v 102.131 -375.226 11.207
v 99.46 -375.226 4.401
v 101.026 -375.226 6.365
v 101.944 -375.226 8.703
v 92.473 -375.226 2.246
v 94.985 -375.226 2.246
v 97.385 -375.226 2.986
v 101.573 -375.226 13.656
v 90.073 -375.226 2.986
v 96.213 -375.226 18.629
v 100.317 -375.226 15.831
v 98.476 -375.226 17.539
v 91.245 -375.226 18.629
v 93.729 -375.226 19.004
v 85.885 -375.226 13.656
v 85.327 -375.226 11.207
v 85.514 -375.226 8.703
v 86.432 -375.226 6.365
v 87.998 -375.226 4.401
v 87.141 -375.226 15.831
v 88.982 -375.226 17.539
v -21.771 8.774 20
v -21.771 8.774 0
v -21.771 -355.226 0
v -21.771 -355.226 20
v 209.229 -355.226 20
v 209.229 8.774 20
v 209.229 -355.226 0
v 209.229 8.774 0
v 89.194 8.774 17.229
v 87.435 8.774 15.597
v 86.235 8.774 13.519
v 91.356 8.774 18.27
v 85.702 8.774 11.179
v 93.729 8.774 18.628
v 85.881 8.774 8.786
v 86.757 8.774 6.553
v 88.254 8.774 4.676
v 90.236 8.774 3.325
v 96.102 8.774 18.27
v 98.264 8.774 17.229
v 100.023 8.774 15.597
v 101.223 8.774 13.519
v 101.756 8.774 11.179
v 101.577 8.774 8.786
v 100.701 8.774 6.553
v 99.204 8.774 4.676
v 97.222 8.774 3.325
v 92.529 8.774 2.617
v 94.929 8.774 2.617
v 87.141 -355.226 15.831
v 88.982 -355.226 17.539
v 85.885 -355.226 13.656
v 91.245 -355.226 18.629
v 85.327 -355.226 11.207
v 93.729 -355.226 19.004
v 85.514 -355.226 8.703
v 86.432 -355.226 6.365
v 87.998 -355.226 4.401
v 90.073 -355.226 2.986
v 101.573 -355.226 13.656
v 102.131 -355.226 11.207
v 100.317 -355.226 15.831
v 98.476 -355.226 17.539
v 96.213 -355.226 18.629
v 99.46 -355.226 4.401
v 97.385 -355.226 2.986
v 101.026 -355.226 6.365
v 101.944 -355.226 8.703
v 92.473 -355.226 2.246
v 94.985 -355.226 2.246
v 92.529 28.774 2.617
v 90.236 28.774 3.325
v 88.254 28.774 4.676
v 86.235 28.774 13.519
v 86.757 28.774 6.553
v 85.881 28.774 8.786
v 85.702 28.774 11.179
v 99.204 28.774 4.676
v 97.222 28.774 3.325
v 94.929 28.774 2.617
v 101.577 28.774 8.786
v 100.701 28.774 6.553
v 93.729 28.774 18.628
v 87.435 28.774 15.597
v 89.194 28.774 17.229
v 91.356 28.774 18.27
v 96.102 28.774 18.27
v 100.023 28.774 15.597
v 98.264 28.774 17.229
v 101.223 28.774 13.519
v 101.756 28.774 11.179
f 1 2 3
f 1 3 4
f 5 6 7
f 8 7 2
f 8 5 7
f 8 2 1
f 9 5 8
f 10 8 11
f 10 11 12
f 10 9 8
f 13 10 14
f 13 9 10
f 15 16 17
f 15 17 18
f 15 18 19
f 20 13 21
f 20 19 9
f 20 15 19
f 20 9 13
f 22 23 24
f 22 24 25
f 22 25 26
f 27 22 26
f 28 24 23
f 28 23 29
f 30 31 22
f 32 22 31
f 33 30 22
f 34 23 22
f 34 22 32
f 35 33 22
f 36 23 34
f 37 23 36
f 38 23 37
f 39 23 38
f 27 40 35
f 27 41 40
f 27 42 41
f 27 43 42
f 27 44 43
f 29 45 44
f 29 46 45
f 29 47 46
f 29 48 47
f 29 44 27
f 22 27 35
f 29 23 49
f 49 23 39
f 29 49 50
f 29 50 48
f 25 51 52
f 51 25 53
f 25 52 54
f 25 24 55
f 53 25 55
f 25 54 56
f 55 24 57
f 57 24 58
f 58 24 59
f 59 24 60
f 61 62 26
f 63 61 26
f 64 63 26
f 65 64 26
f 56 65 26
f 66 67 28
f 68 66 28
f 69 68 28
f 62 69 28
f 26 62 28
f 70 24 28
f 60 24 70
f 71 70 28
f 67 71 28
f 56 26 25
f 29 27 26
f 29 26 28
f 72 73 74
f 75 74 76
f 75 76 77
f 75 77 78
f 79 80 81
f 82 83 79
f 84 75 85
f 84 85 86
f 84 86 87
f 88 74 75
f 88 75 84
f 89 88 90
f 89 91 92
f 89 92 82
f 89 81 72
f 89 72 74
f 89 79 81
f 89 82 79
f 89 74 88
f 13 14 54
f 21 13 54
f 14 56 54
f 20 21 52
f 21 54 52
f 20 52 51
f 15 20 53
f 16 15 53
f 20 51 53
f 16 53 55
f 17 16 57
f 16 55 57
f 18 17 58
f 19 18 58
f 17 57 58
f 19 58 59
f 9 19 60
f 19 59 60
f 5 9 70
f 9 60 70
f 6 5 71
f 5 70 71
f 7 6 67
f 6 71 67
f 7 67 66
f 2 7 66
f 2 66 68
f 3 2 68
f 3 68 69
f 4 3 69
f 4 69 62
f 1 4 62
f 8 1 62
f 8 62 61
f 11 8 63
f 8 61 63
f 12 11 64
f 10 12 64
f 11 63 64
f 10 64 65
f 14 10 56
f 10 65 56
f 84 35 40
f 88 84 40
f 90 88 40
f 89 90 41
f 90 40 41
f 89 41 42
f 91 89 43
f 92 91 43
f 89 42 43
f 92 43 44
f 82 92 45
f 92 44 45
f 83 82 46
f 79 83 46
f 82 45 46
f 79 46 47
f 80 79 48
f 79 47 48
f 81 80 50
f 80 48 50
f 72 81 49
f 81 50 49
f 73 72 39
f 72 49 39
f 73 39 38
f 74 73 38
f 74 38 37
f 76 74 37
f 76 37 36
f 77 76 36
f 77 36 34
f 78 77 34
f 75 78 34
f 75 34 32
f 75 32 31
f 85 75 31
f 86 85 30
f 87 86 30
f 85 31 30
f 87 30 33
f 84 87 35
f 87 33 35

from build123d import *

# Parameters (mm, degrees)
SKETCH1_W           = 241
SKETCH1_H           = 374
BOSS_EXTRUDE1_DEPTH = 20
SKETCH5_R           = 8.426003706
BOSS_EXTRUDE3_DEPTH = 20
SKETCH6_W           = 241
SKETCH6_H           = 20
CUT_EXTRUDE1_DEPTH  = 5
SKETCH7_R           = 8.40478741
BOSS_EXTRUDE4_DEPTH = 20
SKETCH8_W           = 20
SKETCH8_H           = 369
CUT_EXTRUDE2_DEPTH  = 5
SKETCH9_W           = 20
SKETCH9_H           = 369
CUT_EXTRUDE3_DEPTH  = 5
SKETCH11_R          = 8.426003706
CUT_EXTRUDE4_DEPTH  = 10
SKETCH12_R          = 8.40478741
CUT_EXTRUDE5_DEPTH  = 10
SKETCH13_R          = 8.40478741
BOSS_EXTRUDE6_DEPTH = 10
SKETCH14_R          = 8.426003706
BOSS_EXTRUDE7_DEPTH = 10
SKETCH15_W          = 231
SKETCH15_H          = 20
CUT_EXTRUDE6_DEPTH  = 5
SKETCH16_R          = 8.05
BOSS_EXTRUDE8_DEPTH = 20


with BuildPart() as part:
    # Sketch1 → Boss-Extrude1 (new body)
    with BuildSketch(Plane.XY):
        with Locations((93.728999485, -168.226086957)):
            Rectangle(SKETCH1_W, SKETCH1_H)
    extrude(amount=BOSS_EXTRUDE1_DEPTH)

    # Sketch5 → Boss-Extrude3 (add)
    with BuildSketch(Plane.XZ.offset(355.226086957)):
        with Locations(Location((93.728999485, 10.577560917, 0), (0, 0, 90))):
            Circle(SKETCH5_R)
    extrude(amount=BOSS_EXTRUDE3_DEPTH)

    # Sketch6 → Cut-Extrude1 (cut)
    with BuildSketch(Plane(origin=(0, 18.773913043, 0), x_dir=(1, 0, 0), z_dir=(0, 1, 0))):
        with Locations((93.728999485, -10)):
            Rectangle(SKETCH6_W, SKETCH6_H)
    extrude(amount=-CUT_EXTRUDE1_DEPTH, mode=Mode.SUBTRACT)

    # Sketch7 → Boss-Extrude4 (add)
    with BuildSketch(Plane(origin=(0, 13.773913043, 0), x_dir=(1, 0, 0), z_dir=(0, 1, 0))):
        with Locations(Location((93.728999485, -10.486825902, 0), (0, 0, 270))):
            Circle(SKETCH7_R)
    extrude(amount=BOSS_EXTRUDE4_DEPTH)

    # Sketch8 → Cut-Extrude2 (cut)
    with BuildSketch(Plane.ZY.offset(26.771000515)):
        with Locations((10, -170.726086957)):
            Rectangle(SKETCH8_W, SKETCH8_H)
    extrude(amount=-CUT_EXTRUDE2_DEPTH, mode=Mode.SUBTRACT)

    # Sketch9 → Cut-Extrude3 (cut)
    with BuildSketch(Plane(origin=(214.228999485, 0, 0), x_dir=(0, 0, -1), z_dir=(1, 0, 0))):
        with Locations((-10, -170.726086957)):
            Rectangle(SKETCH9_W, SKETCH9_H)
    extrude(amount=-CUT_EXTRUDE3_DEPTH, mode=Mode.SUBTRACT)

    # Sketch11 → Cut-Extrude4 (cut)
    with BuildSketch(Plane.XZ.offset(375.226086957)):
        with Locations(Location((93.728999485, 10.577560917, 0), (0, 0, 90))):
            Circle(SKETCH11_R)
    extrude(amount=-CUT_EXTRUDE4_DEPTH, mode=Mode.SUBTRACT)

    # Sketch12 → Cut-Extrude5 (cut)
    with BuildSketch(Plane(origin=(0, 33.773913043, 0), x_dir=(1, 0, 0), z_dir=(0, 1, 0))):
        with Locations(Location((93.728999485, -10.486825902, 0), (0, 0, 270))):
            Circle(SKETCH12_R)
    extrude(amount=-CUT_EXTRUDE5_DEPTH, mode=Mode.SUBTRACT)

    # Sketch13 → Boss-Extrude6 (add)
    with BuildSketch(Plane(origin=(0, 23.773913043, 0), x_dir=(1, 0, 0), z_dir=(0, 1, 0))):
        with Locations(Location((93.728999485, -10.486825902, 0), (0, 0, 270))):
            Circle(SKETCH13_R)
    extrude(amount=BOSS_EXTRUDE6_DEPTH)

    # Sketch14 → Boss-Extrude7 (add)
    with BuildSketch(Plane.XZ.offset(365.226086957)):
        with Locations(Location((93.728999485, 10.577560917, 0), (0, 0, 90))):
            Circle(SKETCH14_R)
    extrude(amount=BOSS_EXTRUDE7_DEPTH)

    # Sketch15 → Cut-Extrude6 (cut)
    with BuildSketch(Plane(origin=(0, 13.773913043, 0), x_dir=(1, 0, 0), z_dir=(0, 1, 0))):
        with Locations((93.728999485, -10)):
            Rectangle(SKETCH15_W, SKETCH15_H)
    extrude(amount=-CUT_EXTRUDE6_DEPTH, mode=Mode.SUBTRACT)


with BuildPart() as body_2:
    # of the pieces the cut leaves, the one that is kept (cut_extrude6_keep)
    add(part.part.solids().sort_by_distance((-21.771000515, 8.773913043, 0))[0])

    # Sketch16 → Boss-Extrude8 (add)
    with BuildSketch(Plane(origin=(0, 8.773913043, 0), x_dir=(1, 0, 0), z_dir=(0, 1, 0))):
        with Locations(Location((93.728999485, -10.577560917, 0), (0, 0, 270))):
            Circle(SKETCH16_R)
    extrude(amount=BOSS_EXTRUDE8_DEPTH)


solid = body_2.part
